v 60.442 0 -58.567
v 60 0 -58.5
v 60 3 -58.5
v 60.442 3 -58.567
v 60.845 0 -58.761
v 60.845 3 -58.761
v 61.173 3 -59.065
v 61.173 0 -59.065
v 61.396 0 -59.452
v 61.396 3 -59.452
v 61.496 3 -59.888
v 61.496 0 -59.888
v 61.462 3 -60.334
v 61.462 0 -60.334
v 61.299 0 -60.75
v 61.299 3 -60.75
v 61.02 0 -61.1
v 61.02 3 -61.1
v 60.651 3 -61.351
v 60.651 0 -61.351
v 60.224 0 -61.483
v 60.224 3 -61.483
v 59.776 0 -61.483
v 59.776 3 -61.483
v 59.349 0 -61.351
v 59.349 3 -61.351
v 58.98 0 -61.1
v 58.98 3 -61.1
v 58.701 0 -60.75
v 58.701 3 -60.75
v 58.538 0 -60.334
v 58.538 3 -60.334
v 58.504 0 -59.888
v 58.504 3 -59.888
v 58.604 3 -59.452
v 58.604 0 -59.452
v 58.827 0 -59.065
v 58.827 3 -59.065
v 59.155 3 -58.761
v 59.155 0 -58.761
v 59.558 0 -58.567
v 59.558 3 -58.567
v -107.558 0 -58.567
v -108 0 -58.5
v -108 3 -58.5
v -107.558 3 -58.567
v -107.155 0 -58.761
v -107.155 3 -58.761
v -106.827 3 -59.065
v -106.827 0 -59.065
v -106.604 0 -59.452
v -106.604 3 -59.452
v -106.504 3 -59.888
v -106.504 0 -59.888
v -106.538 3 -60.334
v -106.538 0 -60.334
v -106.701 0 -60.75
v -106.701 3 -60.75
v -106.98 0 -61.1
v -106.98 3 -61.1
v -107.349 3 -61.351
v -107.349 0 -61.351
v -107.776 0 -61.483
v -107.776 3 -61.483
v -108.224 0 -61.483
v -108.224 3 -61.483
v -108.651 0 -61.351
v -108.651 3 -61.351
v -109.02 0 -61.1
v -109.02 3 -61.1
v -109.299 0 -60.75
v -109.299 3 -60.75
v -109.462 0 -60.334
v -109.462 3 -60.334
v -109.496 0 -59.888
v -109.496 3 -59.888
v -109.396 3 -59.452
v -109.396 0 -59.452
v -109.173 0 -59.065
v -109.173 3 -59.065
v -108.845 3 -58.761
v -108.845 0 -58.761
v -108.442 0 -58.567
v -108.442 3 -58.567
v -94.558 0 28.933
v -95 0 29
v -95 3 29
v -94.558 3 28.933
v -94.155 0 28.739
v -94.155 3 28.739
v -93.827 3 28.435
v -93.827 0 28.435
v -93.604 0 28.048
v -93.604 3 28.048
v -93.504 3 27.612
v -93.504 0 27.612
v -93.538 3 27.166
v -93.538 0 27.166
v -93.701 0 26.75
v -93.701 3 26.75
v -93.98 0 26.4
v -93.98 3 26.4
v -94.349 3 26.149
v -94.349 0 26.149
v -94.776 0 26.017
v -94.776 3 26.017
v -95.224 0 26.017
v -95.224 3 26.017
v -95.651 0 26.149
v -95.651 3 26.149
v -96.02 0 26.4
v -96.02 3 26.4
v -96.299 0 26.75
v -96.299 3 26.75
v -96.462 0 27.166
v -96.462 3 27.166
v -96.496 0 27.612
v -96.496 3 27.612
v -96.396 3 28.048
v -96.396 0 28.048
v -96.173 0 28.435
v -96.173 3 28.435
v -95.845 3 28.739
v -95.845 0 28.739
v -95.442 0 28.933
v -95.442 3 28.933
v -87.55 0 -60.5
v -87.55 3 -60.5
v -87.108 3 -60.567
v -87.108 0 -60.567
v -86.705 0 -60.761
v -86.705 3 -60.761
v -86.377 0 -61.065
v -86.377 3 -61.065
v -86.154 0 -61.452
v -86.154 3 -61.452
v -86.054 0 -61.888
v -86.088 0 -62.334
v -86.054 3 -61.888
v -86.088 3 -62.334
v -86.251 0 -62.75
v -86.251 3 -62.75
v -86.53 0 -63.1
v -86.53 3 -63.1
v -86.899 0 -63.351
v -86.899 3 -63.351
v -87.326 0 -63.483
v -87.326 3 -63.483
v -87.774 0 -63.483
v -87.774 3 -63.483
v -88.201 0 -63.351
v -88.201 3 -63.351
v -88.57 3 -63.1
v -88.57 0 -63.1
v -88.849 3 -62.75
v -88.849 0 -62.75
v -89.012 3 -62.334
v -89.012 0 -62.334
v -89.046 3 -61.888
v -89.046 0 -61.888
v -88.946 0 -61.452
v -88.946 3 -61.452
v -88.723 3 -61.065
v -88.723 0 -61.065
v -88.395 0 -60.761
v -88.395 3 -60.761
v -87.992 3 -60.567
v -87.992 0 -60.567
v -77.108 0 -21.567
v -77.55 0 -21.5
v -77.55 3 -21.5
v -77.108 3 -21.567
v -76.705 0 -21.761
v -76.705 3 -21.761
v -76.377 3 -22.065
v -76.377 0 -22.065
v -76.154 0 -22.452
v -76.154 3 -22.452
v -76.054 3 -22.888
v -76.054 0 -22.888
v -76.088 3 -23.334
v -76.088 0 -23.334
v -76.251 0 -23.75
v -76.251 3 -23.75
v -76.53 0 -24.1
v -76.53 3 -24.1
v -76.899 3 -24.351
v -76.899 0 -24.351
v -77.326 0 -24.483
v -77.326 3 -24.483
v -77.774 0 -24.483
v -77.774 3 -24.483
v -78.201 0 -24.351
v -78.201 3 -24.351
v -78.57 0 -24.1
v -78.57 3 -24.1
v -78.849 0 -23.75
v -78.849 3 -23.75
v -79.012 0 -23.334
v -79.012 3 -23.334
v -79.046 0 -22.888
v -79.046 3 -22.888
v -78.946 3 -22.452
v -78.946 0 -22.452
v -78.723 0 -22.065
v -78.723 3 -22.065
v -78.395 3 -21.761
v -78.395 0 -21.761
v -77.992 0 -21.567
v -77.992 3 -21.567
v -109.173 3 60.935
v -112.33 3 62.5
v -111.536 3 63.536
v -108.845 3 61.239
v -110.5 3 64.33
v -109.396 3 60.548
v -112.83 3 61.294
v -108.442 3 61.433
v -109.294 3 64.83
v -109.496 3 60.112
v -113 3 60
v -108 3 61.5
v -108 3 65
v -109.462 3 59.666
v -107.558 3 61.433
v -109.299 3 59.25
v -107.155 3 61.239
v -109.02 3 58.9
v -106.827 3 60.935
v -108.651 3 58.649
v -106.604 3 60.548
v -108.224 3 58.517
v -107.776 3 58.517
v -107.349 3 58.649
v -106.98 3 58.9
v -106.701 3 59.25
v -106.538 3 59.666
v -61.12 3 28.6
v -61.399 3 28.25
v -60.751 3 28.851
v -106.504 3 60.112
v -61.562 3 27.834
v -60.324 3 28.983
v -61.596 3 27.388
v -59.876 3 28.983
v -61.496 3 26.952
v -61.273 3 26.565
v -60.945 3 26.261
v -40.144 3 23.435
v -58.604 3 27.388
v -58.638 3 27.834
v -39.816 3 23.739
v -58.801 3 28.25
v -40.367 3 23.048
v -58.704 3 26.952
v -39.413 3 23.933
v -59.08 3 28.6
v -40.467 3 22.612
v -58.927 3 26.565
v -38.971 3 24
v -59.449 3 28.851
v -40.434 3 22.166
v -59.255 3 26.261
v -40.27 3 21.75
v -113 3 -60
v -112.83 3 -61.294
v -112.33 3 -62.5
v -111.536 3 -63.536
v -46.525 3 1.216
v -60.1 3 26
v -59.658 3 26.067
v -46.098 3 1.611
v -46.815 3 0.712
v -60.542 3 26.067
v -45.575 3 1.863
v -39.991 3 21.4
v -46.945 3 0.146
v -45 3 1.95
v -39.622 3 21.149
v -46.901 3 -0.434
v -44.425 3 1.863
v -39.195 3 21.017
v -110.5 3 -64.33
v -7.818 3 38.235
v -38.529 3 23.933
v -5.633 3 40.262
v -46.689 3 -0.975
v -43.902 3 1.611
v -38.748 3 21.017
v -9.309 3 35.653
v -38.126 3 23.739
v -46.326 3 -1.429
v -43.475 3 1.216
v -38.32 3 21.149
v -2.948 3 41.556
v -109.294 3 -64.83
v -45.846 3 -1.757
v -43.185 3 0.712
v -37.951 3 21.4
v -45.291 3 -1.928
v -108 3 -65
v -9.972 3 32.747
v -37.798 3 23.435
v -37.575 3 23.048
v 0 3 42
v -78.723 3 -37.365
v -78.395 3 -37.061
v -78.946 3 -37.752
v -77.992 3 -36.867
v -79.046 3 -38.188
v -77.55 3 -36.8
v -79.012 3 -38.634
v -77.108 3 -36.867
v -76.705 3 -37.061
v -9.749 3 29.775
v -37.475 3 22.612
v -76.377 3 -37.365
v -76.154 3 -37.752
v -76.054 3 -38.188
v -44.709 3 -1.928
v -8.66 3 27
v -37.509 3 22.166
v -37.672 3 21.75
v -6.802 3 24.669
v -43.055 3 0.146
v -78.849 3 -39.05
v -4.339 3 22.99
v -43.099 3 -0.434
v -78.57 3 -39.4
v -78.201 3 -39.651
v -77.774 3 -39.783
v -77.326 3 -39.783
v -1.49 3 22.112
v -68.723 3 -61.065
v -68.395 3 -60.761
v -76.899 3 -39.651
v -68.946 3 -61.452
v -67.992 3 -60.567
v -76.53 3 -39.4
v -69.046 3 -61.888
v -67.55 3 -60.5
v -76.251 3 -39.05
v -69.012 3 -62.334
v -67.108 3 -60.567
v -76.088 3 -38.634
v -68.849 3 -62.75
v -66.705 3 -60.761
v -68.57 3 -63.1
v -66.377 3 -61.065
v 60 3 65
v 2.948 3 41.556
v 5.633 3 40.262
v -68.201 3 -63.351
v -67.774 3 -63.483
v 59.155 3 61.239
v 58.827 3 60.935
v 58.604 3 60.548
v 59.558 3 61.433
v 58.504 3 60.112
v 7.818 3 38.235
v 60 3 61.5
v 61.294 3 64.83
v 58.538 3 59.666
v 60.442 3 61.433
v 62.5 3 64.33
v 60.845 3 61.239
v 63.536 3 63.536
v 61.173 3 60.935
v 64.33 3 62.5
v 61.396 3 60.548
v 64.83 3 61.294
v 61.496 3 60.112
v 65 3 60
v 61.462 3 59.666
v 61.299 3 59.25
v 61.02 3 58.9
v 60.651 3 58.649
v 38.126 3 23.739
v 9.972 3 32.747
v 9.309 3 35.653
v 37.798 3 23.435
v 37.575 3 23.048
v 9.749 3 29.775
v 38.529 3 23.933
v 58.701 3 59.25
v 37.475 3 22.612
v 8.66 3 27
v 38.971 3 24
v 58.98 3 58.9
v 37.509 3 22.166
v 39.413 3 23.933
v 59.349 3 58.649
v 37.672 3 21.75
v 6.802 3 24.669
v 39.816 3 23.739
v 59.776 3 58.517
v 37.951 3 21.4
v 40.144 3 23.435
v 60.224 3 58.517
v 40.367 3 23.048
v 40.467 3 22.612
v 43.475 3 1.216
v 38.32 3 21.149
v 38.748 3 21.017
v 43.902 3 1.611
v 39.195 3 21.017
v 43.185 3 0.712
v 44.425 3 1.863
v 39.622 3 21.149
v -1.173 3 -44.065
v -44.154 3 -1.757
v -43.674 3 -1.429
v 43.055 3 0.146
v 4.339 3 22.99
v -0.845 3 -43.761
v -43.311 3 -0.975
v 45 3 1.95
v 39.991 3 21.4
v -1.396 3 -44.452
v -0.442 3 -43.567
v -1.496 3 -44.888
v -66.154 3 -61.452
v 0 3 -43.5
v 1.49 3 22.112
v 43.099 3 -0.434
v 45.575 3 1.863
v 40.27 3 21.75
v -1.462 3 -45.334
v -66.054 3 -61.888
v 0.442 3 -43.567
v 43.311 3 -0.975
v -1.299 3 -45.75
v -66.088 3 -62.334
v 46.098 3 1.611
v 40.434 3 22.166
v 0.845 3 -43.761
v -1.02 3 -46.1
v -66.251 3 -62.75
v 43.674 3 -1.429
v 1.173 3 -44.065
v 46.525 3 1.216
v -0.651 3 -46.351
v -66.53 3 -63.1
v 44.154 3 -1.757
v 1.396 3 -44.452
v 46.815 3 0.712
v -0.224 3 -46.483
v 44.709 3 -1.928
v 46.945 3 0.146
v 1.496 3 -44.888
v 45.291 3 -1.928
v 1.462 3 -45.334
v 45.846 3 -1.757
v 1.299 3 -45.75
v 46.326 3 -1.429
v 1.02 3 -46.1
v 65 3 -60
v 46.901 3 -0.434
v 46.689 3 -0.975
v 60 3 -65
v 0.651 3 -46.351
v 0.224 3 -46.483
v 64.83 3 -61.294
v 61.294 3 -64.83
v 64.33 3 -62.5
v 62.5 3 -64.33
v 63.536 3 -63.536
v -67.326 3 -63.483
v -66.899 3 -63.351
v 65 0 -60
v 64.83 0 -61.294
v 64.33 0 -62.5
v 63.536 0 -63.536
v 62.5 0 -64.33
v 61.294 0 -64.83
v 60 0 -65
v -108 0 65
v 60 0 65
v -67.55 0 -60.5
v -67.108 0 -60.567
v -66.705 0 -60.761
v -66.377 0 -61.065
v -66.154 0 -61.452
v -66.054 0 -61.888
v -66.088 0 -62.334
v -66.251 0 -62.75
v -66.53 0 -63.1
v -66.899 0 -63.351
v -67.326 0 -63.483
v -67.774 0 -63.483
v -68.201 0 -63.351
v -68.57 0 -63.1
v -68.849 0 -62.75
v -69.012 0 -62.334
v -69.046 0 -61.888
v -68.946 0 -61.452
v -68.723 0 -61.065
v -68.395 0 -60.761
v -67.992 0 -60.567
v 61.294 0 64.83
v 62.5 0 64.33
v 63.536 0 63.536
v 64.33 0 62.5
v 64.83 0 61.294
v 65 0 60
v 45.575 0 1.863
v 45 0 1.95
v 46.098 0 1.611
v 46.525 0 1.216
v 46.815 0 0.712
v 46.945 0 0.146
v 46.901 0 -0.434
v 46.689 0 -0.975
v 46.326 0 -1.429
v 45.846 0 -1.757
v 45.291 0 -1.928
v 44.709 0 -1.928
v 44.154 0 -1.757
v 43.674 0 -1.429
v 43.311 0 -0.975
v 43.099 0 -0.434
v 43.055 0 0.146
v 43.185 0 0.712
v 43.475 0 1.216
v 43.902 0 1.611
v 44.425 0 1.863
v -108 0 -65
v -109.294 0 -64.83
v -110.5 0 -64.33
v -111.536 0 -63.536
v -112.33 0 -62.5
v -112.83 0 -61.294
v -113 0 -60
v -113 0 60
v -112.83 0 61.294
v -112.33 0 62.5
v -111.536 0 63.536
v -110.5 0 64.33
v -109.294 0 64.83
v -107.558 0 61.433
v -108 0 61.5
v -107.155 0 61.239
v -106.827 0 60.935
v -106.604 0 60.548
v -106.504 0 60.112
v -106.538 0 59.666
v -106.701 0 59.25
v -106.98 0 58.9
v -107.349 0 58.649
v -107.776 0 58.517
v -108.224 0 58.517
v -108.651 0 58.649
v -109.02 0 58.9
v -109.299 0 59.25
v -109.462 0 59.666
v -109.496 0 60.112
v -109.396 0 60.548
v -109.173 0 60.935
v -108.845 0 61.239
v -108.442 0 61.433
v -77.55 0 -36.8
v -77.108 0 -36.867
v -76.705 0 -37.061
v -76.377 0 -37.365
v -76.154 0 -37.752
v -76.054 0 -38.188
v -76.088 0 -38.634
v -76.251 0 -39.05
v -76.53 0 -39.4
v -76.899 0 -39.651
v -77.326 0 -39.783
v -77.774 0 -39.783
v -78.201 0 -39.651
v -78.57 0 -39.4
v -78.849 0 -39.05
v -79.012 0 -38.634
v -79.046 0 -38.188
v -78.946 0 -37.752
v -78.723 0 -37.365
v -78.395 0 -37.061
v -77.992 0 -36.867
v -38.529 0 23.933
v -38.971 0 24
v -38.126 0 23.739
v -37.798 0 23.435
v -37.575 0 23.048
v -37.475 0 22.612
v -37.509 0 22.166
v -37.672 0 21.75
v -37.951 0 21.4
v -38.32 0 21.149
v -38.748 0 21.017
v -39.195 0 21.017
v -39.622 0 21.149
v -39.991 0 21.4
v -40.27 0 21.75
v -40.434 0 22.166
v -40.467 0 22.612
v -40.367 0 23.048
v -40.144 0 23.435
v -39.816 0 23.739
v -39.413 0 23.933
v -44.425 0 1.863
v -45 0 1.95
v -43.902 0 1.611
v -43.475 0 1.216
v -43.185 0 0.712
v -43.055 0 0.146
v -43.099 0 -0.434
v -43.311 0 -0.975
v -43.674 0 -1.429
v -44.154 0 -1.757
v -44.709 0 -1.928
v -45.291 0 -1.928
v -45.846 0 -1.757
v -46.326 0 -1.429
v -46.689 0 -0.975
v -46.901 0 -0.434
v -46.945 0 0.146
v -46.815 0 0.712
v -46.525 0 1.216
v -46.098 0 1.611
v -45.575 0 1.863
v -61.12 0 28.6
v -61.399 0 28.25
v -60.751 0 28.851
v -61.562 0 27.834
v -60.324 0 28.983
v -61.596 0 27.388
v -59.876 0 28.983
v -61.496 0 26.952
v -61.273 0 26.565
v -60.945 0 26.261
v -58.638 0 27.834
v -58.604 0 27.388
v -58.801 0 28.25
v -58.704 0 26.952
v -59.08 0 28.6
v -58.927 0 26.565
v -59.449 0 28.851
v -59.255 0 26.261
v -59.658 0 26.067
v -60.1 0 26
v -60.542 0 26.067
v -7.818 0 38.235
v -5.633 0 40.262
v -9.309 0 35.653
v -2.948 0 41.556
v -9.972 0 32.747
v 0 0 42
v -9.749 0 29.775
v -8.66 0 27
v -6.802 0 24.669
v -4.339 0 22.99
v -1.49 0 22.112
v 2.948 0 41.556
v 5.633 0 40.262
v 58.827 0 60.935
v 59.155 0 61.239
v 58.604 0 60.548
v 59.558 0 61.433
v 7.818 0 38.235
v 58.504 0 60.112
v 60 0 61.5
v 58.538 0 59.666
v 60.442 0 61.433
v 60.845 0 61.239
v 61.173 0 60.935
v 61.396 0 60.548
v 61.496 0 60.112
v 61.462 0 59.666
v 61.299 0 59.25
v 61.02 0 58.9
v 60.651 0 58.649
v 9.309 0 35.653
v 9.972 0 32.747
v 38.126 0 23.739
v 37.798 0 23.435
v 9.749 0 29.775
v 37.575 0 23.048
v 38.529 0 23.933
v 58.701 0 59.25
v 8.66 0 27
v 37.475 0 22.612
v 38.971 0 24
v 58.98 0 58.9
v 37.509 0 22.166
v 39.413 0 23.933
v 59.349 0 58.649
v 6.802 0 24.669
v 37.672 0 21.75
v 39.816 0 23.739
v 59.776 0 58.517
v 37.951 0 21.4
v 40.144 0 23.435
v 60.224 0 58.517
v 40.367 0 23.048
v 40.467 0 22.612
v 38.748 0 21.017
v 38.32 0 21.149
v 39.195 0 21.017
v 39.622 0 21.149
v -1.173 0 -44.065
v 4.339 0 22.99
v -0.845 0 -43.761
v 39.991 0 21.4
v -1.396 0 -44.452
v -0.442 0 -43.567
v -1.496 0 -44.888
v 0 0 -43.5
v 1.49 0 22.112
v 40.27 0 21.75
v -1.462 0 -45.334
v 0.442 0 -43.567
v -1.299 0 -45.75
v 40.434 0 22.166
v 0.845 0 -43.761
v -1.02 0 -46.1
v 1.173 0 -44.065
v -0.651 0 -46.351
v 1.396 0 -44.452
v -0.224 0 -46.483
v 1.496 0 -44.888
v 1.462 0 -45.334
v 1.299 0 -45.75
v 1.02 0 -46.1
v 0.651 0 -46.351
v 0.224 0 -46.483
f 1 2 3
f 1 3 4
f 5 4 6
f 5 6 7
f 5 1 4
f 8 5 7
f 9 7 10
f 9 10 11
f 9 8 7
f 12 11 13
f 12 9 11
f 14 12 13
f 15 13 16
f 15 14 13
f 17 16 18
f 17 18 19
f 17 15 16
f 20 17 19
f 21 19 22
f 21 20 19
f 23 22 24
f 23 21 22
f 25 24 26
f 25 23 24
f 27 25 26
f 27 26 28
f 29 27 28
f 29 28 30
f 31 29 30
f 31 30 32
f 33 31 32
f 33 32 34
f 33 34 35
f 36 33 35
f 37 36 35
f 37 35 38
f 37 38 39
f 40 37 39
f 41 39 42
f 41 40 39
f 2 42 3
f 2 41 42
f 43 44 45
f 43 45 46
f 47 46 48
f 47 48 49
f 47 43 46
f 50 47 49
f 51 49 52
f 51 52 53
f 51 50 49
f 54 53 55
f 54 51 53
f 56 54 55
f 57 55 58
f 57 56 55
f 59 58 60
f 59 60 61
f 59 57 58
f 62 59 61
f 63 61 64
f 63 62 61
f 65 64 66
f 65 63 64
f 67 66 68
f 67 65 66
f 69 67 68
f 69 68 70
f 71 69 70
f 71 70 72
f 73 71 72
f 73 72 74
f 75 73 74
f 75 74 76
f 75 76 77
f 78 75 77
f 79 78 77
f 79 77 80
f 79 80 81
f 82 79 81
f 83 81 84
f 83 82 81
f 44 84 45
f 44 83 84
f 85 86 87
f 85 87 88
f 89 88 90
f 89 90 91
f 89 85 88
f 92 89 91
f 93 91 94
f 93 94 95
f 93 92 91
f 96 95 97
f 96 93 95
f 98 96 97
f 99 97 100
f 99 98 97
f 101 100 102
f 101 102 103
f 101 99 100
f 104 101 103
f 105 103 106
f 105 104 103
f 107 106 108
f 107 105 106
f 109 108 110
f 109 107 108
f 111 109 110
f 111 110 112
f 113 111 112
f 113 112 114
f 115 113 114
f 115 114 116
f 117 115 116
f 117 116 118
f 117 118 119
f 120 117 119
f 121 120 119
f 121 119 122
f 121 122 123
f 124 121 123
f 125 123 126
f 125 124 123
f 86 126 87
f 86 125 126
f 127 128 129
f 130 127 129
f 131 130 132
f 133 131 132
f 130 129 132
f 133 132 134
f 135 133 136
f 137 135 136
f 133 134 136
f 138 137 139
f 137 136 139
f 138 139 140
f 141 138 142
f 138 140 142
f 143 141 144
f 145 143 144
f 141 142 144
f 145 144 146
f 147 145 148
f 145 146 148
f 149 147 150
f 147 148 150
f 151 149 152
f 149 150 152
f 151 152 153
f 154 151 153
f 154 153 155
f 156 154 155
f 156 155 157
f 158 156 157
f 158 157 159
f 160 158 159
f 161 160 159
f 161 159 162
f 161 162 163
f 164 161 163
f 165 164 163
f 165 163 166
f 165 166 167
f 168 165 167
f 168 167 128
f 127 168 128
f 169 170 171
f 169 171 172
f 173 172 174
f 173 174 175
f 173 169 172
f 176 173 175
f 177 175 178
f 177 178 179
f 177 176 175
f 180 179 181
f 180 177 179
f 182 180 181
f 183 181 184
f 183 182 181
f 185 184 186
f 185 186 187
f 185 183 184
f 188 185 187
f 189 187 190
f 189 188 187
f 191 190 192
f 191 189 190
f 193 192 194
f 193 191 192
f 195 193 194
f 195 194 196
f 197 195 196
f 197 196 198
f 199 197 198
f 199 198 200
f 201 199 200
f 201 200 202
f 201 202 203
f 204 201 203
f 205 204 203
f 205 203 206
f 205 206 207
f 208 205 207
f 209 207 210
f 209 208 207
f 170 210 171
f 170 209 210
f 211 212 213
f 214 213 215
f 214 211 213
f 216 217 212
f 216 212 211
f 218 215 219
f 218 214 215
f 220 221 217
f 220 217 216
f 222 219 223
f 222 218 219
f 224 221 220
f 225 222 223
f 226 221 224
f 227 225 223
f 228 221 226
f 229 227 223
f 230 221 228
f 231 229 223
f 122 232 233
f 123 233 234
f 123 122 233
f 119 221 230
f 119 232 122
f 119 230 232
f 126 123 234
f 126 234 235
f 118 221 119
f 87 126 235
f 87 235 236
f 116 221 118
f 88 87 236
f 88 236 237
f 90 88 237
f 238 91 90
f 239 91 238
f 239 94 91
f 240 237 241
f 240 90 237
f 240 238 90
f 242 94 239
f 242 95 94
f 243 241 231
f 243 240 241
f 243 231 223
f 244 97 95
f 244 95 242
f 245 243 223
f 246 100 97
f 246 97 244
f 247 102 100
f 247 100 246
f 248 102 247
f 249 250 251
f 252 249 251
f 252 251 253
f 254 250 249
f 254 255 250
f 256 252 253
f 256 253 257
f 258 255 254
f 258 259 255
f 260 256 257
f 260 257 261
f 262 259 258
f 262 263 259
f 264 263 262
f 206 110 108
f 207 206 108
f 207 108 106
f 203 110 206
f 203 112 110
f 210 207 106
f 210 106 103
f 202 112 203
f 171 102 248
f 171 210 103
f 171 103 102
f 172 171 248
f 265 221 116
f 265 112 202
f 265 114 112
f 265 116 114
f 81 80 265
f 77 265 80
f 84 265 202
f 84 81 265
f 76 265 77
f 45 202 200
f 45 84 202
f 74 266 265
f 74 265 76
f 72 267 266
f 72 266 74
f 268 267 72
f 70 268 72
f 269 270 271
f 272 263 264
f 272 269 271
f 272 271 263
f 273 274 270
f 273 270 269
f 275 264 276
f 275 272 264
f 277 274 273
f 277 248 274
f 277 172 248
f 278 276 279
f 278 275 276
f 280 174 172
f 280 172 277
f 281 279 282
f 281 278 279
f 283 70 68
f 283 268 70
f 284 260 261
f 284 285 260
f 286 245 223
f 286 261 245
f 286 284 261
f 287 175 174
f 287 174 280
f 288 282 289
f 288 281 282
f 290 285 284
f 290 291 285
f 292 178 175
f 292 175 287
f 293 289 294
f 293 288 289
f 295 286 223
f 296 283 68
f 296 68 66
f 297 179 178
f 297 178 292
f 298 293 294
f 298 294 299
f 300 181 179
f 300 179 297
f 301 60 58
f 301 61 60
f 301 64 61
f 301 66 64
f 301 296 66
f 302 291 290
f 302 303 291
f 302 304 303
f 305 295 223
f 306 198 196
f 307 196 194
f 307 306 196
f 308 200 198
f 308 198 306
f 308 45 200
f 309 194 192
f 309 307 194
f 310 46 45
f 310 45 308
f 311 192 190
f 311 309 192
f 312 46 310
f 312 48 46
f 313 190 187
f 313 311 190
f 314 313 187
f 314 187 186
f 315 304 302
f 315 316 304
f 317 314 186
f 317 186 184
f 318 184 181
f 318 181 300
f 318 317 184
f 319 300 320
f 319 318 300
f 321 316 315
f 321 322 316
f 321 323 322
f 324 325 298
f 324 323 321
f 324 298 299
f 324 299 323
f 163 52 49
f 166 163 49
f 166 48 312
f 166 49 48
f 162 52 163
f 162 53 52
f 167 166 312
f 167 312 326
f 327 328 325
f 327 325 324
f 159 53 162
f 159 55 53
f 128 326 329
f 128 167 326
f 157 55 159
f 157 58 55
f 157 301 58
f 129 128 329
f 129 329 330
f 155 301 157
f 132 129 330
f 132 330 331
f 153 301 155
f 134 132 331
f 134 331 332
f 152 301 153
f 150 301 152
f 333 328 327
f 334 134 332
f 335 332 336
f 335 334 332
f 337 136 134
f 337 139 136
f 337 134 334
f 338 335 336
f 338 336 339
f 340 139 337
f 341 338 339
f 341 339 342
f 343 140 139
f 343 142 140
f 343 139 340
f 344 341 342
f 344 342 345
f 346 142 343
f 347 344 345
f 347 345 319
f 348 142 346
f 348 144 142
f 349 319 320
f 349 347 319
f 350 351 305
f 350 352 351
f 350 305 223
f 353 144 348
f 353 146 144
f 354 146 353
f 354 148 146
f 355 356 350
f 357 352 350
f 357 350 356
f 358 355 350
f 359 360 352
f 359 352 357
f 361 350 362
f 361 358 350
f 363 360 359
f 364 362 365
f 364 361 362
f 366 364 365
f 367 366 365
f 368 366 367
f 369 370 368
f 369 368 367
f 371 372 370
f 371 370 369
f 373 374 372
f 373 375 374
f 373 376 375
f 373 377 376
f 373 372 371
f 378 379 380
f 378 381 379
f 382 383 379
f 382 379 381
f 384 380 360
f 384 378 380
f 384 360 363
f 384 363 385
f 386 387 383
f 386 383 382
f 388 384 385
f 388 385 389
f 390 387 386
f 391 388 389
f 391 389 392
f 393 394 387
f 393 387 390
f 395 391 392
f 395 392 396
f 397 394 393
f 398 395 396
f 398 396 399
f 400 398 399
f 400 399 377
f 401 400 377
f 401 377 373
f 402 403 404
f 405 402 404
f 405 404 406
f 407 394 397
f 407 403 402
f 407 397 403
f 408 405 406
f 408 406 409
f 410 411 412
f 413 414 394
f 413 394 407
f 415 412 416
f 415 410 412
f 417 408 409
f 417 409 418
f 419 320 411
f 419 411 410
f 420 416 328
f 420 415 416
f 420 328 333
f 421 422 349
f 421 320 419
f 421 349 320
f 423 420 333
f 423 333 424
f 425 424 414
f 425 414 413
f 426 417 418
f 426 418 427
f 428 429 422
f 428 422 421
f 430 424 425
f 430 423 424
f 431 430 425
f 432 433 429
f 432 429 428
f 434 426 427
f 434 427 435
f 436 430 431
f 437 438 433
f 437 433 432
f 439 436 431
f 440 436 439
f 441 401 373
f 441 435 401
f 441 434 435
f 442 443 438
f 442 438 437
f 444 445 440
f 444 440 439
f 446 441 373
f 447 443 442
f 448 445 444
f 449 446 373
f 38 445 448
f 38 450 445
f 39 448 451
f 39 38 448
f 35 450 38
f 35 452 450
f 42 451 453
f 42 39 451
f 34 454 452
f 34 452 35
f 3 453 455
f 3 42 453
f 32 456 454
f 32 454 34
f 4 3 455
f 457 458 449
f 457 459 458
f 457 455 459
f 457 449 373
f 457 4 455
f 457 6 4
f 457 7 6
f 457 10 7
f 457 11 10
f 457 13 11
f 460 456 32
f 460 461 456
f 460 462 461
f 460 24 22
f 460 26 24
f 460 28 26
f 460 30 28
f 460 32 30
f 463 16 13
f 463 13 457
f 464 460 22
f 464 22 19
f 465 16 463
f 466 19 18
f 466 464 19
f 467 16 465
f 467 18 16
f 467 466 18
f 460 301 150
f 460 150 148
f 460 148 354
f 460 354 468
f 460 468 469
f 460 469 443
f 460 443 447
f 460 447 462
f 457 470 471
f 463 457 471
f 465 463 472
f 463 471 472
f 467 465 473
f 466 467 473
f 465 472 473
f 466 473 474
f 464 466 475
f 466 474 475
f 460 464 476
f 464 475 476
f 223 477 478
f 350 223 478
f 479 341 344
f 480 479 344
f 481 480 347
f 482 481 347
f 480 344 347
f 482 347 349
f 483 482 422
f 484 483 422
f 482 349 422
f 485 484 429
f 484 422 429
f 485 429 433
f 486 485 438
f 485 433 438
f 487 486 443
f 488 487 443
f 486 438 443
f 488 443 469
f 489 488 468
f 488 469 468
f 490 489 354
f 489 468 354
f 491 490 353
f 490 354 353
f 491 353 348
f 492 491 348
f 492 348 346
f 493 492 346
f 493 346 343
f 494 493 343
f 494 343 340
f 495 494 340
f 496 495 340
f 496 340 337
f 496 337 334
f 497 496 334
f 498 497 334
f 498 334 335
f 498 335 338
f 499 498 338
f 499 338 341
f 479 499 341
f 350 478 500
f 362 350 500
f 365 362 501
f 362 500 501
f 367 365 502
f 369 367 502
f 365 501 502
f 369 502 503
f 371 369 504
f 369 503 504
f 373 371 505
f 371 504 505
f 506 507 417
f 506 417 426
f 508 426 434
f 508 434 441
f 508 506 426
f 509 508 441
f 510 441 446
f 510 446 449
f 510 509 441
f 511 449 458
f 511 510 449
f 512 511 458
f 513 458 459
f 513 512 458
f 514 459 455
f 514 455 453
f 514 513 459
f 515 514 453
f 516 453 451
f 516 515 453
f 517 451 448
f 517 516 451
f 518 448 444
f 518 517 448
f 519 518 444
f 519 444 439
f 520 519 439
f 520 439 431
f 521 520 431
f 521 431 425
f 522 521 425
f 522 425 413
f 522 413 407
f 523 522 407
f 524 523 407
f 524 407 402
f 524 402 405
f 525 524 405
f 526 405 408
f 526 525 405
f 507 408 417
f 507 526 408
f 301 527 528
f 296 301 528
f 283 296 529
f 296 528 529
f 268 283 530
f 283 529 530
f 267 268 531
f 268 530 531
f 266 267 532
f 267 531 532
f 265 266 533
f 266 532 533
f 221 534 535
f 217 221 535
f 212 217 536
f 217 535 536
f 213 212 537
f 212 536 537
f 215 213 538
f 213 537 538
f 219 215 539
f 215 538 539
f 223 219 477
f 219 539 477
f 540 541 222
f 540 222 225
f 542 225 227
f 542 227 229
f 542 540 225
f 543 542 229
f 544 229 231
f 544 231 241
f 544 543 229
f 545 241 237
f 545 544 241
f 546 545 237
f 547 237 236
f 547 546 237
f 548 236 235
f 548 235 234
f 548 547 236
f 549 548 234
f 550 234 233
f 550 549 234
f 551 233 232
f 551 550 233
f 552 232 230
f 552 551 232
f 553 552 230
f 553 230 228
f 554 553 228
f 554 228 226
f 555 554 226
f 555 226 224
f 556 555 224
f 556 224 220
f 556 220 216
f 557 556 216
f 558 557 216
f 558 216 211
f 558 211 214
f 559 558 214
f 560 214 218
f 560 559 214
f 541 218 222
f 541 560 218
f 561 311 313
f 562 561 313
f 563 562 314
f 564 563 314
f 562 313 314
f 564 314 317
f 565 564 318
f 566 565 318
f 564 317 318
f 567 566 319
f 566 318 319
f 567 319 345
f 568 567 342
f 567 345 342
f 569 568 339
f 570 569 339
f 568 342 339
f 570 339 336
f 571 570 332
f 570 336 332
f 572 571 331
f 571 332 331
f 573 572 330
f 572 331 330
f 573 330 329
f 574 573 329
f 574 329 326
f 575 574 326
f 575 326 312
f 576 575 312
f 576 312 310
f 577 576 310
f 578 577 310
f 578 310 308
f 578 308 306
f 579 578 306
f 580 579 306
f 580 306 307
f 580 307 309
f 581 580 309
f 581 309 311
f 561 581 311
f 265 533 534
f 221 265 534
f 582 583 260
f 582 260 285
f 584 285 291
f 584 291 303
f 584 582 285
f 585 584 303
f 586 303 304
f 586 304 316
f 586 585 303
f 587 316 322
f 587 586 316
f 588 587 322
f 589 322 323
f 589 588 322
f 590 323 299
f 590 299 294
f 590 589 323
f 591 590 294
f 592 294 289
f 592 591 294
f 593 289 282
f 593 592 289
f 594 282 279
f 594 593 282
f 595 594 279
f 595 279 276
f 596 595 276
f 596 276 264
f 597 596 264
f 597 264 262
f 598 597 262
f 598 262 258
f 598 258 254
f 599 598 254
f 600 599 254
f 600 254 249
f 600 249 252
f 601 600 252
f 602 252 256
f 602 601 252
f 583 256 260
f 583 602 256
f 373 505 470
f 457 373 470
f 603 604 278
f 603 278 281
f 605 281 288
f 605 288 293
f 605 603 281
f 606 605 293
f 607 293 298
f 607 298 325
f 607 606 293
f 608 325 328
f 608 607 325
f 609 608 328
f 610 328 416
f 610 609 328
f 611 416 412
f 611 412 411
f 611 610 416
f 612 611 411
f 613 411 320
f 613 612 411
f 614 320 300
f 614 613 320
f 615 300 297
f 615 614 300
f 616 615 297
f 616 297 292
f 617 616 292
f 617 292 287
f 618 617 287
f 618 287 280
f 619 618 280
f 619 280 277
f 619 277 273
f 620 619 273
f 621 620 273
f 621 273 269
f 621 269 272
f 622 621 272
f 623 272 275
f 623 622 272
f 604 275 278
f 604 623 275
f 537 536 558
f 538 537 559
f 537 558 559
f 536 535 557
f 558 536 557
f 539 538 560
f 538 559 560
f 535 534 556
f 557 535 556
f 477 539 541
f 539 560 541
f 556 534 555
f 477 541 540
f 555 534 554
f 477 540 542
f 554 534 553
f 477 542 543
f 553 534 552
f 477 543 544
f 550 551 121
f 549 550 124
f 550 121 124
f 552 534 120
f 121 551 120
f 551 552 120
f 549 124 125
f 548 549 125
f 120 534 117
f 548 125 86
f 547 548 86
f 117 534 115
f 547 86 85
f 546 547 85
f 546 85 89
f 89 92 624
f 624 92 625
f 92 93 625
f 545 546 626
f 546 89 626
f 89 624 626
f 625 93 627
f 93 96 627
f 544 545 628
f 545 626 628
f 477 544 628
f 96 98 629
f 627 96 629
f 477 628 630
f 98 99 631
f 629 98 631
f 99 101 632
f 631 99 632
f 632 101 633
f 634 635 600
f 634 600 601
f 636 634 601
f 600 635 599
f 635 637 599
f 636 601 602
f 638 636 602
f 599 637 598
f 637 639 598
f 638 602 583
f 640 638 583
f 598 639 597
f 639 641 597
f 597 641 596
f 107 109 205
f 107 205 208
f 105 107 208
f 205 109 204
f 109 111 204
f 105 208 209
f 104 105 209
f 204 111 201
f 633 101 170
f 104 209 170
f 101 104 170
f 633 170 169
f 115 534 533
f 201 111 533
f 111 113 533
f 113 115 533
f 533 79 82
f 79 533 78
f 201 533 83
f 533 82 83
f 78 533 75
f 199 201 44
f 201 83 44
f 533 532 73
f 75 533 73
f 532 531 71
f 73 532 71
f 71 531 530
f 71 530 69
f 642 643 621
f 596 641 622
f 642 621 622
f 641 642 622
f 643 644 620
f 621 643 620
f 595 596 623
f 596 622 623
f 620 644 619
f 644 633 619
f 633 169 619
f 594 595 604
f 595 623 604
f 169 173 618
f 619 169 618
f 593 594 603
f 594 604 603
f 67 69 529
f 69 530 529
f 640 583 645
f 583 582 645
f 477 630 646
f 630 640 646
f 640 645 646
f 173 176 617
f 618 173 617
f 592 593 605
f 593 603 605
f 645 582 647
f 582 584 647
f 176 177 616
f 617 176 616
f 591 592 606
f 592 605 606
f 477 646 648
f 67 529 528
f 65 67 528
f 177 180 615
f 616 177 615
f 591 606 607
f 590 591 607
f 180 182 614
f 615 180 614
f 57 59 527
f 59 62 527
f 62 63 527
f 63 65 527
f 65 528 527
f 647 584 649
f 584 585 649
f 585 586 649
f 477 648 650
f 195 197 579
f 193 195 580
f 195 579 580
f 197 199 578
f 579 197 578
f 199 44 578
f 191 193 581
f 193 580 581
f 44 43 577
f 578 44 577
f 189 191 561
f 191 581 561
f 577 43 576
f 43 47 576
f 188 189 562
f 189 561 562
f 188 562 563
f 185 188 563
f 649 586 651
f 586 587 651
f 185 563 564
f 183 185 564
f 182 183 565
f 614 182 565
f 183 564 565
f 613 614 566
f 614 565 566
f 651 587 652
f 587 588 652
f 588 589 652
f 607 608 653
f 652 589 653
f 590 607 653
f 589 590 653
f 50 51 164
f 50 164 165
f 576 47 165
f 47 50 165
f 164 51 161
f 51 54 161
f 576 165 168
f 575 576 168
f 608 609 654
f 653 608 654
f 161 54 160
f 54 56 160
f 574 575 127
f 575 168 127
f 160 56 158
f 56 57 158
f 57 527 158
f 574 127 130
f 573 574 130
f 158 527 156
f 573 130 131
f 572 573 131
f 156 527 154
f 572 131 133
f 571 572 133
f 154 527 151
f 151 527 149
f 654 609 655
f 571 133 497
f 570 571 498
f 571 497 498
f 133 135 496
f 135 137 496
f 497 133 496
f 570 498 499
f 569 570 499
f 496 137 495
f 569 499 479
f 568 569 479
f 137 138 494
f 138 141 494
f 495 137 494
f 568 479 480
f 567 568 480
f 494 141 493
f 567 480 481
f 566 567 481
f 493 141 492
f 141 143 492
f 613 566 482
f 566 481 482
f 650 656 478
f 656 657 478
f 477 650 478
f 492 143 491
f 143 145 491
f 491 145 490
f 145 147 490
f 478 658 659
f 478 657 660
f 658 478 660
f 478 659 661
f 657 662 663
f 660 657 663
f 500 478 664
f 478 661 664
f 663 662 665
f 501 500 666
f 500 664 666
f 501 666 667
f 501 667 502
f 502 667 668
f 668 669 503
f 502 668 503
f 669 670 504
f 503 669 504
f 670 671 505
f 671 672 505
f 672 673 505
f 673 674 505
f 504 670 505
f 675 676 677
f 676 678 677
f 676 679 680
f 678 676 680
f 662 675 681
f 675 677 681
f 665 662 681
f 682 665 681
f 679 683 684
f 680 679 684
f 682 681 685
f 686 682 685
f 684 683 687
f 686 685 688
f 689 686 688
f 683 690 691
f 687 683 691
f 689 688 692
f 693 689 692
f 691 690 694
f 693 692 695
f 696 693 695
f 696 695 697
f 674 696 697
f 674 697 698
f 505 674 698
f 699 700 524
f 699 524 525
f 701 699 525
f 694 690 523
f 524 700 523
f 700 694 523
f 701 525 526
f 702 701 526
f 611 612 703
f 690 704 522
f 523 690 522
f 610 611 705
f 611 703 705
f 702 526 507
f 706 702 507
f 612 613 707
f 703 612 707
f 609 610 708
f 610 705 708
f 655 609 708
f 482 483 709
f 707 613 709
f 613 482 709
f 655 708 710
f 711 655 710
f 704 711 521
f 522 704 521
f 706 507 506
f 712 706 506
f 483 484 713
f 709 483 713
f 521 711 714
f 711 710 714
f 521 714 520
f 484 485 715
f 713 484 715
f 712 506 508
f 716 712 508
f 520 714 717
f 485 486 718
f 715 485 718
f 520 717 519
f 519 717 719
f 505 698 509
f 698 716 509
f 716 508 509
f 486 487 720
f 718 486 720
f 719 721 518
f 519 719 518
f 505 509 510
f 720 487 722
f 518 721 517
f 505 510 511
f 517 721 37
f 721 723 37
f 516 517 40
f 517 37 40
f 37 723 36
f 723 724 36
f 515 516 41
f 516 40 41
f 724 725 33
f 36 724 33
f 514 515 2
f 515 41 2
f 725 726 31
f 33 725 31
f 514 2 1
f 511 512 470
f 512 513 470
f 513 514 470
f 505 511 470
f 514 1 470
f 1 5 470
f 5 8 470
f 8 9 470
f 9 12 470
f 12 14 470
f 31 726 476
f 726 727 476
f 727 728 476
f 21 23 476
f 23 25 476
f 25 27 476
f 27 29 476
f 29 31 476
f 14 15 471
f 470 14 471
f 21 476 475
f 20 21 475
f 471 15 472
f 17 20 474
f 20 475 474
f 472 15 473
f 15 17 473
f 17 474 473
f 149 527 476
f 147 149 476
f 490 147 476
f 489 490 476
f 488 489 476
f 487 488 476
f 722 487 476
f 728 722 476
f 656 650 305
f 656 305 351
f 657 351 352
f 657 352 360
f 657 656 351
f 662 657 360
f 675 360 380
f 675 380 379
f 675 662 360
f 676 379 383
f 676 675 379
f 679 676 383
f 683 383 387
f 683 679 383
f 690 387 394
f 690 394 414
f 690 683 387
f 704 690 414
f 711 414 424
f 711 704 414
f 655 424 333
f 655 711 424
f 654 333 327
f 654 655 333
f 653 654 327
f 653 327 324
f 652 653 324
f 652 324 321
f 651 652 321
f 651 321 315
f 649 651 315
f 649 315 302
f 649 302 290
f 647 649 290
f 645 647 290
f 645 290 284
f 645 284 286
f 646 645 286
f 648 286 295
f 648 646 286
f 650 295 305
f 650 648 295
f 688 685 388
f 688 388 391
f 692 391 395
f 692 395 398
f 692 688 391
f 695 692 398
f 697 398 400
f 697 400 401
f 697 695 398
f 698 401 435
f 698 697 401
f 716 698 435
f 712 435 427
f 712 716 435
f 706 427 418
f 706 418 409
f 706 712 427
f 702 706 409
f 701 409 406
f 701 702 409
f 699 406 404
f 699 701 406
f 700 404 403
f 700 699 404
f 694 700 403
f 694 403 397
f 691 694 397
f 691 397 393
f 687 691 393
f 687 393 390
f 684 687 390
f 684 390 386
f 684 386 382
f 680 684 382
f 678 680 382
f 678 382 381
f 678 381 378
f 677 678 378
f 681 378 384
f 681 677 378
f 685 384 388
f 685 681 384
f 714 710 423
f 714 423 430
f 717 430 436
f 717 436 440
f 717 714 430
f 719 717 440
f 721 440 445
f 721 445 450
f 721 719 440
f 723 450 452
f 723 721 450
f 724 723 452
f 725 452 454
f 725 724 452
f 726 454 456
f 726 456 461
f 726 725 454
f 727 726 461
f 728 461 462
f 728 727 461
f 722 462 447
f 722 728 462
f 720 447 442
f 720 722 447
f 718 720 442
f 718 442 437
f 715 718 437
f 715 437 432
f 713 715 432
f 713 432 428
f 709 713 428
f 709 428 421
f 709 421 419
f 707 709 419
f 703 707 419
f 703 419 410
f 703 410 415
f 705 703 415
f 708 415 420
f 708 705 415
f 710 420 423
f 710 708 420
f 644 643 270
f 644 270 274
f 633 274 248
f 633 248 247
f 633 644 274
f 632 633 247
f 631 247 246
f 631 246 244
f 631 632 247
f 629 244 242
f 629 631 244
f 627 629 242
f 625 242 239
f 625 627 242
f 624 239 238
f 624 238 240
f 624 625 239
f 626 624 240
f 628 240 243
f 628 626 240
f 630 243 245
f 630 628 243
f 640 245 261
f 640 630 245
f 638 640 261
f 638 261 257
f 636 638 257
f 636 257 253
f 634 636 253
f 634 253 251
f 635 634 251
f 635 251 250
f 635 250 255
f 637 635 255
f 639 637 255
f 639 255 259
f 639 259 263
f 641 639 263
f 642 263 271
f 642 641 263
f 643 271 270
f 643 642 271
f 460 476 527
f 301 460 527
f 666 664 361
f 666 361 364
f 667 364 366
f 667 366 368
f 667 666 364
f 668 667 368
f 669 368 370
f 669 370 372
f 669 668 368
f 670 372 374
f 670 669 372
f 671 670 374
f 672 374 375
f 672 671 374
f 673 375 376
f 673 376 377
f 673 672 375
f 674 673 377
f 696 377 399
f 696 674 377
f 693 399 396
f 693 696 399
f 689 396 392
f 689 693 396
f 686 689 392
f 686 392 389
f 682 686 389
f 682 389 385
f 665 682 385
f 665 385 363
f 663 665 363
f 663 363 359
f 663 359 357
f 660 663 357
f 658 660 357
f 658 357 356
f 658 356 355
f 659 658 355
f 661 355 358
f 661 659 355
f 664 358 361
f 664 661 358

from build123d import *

# Parameters (mm, degrees)
SKETCH_1_R          = 1.5
SKETCH_1_R_2        = 1.95
SKETCH_1_R_3        = 10
EXTRUDE_1_DEPTH     = 3
SKETCH_2_R          = 1.5
CUT_EXTRUDE_1_DEPTH = 131.395552071


with BuildPart() as part:
    # 草图1 → 凸台-拉伸1 (new body)
    with BuildSketch(Plane(origin=(0, 0, 0), x_dir=(1, 0, 0), z_dir=(0, 1, 0))):
        with BuildLine():
            Line((-108, -65), (60, -65))
            ThreePointArc((60, -65), (63.535533906, -63.535533906), (65, -60))
            Line((65, -60), (65, 60))
            ThreePointArc((65, 60), (63.535533906, 63.535533906), (60, 65))
            Line((60, 65), (-108, 65))
            ThreePointArc((-108, 65), (-111.535533906, 63.535533906), (-113, 60))
            Line((-113, 60), (-113, -60))
            ThreePointArc((-113, -60), (-111.535533906, -63.535533906), (-108, -65))
        make_face()
        with Locations(Location((0, 45, 0), (0, 0, 270))):
            Circle(SKETCH_1_R, mode=Mode.SUBTRACT)
        with Locations(Location((-38.97114317, -22.5, 0), (0, 0, 270))):
            Circle(SKETCH_1_R, mode=Mode.SUBTRACT)
        with Locations(Location((38.97114317, -22.5, 0), (0, 0, 270))):
            Circle(SKETCH_1_R, mode=Mode.SUBTRACT)
        with Locations(Location((-45, 0, 0), (0, 0, 270))):
            Circle(SKETCH_1_R_2, mode=Mode.SUBTRACT)
        with Locations(Location((45, 0, 0), (0, 0, 270))):
            Circle(SKETCH_1_R_2, mode=Mode.SUBTRACT)
        with Locations(Location((-95, -27.5, 0), (0, 0, 270))):
            Circle(SKETCH_1_R, mode=Mode.SUBTRACT)
        with Locations(Location((-60.1, -27.5, 0), (0, 0, 90))):
            Circle(SKETCH_1_R, mode=Mode.SUBTRACT)
        with Locations(Location((-77.55, 23, 0), (0, 0, 270))):
            Circle(SKETCH_1_R, mode=Mode.SUBTRACT)
        with Locations(Location((-108, 60, 0), (0, 0, 270))):
            Circle(SKETCH_1_R, mode=Mode.SUBTRACT)
        with Locations(Location((60, 60, 0), (0, 0, 270))):
            Circle(SKETCH_1_R, mode=Mode.SUBTRACT)
        with Locations(Location((60, -60, 0), (0, 0, 270))):
            Circle(SKETCH_1_R, mode=Mode.SUBTRACT)
        with Locations(Location((-108, -60, 0), (0, 0, 270))):
            Circle(SKETCH_1_R, mode=Mode.SUBTRACT)
        with Locations(Location((0, -32, 0), (0, 0, 270))):
            Circle(SKETCH_1_R_3, mode=Mode.SUBTRACT)
    extrude(amount=EXTRUDE_1_DEPTH)

    # 草图2 → 切除-拉伸1 (cut, through all)
    with BuildSketch(Plane(origin=(0, 3, 0), x_dir=(1, 0, 0), z_dir=(0, 1, 0))):
        with Locations(Location((-87.55, 62, 0), (0, 0, 270))):
            Circle(SKETCH_2_R)
        with Locations(Location((-67.55, 62, 0), (0, 0, 270))):
            Circle(SKETCH_2_R)
        with Locations(Location((-77.55, 38.3, 0), (0, 0, 270))):
            Circle(SKETCH_2_R)
    extrude(amount=-CUT_EXTRUDE_1_DEPTH, mode=Mode.SUBTRACT)


solid = part.part
